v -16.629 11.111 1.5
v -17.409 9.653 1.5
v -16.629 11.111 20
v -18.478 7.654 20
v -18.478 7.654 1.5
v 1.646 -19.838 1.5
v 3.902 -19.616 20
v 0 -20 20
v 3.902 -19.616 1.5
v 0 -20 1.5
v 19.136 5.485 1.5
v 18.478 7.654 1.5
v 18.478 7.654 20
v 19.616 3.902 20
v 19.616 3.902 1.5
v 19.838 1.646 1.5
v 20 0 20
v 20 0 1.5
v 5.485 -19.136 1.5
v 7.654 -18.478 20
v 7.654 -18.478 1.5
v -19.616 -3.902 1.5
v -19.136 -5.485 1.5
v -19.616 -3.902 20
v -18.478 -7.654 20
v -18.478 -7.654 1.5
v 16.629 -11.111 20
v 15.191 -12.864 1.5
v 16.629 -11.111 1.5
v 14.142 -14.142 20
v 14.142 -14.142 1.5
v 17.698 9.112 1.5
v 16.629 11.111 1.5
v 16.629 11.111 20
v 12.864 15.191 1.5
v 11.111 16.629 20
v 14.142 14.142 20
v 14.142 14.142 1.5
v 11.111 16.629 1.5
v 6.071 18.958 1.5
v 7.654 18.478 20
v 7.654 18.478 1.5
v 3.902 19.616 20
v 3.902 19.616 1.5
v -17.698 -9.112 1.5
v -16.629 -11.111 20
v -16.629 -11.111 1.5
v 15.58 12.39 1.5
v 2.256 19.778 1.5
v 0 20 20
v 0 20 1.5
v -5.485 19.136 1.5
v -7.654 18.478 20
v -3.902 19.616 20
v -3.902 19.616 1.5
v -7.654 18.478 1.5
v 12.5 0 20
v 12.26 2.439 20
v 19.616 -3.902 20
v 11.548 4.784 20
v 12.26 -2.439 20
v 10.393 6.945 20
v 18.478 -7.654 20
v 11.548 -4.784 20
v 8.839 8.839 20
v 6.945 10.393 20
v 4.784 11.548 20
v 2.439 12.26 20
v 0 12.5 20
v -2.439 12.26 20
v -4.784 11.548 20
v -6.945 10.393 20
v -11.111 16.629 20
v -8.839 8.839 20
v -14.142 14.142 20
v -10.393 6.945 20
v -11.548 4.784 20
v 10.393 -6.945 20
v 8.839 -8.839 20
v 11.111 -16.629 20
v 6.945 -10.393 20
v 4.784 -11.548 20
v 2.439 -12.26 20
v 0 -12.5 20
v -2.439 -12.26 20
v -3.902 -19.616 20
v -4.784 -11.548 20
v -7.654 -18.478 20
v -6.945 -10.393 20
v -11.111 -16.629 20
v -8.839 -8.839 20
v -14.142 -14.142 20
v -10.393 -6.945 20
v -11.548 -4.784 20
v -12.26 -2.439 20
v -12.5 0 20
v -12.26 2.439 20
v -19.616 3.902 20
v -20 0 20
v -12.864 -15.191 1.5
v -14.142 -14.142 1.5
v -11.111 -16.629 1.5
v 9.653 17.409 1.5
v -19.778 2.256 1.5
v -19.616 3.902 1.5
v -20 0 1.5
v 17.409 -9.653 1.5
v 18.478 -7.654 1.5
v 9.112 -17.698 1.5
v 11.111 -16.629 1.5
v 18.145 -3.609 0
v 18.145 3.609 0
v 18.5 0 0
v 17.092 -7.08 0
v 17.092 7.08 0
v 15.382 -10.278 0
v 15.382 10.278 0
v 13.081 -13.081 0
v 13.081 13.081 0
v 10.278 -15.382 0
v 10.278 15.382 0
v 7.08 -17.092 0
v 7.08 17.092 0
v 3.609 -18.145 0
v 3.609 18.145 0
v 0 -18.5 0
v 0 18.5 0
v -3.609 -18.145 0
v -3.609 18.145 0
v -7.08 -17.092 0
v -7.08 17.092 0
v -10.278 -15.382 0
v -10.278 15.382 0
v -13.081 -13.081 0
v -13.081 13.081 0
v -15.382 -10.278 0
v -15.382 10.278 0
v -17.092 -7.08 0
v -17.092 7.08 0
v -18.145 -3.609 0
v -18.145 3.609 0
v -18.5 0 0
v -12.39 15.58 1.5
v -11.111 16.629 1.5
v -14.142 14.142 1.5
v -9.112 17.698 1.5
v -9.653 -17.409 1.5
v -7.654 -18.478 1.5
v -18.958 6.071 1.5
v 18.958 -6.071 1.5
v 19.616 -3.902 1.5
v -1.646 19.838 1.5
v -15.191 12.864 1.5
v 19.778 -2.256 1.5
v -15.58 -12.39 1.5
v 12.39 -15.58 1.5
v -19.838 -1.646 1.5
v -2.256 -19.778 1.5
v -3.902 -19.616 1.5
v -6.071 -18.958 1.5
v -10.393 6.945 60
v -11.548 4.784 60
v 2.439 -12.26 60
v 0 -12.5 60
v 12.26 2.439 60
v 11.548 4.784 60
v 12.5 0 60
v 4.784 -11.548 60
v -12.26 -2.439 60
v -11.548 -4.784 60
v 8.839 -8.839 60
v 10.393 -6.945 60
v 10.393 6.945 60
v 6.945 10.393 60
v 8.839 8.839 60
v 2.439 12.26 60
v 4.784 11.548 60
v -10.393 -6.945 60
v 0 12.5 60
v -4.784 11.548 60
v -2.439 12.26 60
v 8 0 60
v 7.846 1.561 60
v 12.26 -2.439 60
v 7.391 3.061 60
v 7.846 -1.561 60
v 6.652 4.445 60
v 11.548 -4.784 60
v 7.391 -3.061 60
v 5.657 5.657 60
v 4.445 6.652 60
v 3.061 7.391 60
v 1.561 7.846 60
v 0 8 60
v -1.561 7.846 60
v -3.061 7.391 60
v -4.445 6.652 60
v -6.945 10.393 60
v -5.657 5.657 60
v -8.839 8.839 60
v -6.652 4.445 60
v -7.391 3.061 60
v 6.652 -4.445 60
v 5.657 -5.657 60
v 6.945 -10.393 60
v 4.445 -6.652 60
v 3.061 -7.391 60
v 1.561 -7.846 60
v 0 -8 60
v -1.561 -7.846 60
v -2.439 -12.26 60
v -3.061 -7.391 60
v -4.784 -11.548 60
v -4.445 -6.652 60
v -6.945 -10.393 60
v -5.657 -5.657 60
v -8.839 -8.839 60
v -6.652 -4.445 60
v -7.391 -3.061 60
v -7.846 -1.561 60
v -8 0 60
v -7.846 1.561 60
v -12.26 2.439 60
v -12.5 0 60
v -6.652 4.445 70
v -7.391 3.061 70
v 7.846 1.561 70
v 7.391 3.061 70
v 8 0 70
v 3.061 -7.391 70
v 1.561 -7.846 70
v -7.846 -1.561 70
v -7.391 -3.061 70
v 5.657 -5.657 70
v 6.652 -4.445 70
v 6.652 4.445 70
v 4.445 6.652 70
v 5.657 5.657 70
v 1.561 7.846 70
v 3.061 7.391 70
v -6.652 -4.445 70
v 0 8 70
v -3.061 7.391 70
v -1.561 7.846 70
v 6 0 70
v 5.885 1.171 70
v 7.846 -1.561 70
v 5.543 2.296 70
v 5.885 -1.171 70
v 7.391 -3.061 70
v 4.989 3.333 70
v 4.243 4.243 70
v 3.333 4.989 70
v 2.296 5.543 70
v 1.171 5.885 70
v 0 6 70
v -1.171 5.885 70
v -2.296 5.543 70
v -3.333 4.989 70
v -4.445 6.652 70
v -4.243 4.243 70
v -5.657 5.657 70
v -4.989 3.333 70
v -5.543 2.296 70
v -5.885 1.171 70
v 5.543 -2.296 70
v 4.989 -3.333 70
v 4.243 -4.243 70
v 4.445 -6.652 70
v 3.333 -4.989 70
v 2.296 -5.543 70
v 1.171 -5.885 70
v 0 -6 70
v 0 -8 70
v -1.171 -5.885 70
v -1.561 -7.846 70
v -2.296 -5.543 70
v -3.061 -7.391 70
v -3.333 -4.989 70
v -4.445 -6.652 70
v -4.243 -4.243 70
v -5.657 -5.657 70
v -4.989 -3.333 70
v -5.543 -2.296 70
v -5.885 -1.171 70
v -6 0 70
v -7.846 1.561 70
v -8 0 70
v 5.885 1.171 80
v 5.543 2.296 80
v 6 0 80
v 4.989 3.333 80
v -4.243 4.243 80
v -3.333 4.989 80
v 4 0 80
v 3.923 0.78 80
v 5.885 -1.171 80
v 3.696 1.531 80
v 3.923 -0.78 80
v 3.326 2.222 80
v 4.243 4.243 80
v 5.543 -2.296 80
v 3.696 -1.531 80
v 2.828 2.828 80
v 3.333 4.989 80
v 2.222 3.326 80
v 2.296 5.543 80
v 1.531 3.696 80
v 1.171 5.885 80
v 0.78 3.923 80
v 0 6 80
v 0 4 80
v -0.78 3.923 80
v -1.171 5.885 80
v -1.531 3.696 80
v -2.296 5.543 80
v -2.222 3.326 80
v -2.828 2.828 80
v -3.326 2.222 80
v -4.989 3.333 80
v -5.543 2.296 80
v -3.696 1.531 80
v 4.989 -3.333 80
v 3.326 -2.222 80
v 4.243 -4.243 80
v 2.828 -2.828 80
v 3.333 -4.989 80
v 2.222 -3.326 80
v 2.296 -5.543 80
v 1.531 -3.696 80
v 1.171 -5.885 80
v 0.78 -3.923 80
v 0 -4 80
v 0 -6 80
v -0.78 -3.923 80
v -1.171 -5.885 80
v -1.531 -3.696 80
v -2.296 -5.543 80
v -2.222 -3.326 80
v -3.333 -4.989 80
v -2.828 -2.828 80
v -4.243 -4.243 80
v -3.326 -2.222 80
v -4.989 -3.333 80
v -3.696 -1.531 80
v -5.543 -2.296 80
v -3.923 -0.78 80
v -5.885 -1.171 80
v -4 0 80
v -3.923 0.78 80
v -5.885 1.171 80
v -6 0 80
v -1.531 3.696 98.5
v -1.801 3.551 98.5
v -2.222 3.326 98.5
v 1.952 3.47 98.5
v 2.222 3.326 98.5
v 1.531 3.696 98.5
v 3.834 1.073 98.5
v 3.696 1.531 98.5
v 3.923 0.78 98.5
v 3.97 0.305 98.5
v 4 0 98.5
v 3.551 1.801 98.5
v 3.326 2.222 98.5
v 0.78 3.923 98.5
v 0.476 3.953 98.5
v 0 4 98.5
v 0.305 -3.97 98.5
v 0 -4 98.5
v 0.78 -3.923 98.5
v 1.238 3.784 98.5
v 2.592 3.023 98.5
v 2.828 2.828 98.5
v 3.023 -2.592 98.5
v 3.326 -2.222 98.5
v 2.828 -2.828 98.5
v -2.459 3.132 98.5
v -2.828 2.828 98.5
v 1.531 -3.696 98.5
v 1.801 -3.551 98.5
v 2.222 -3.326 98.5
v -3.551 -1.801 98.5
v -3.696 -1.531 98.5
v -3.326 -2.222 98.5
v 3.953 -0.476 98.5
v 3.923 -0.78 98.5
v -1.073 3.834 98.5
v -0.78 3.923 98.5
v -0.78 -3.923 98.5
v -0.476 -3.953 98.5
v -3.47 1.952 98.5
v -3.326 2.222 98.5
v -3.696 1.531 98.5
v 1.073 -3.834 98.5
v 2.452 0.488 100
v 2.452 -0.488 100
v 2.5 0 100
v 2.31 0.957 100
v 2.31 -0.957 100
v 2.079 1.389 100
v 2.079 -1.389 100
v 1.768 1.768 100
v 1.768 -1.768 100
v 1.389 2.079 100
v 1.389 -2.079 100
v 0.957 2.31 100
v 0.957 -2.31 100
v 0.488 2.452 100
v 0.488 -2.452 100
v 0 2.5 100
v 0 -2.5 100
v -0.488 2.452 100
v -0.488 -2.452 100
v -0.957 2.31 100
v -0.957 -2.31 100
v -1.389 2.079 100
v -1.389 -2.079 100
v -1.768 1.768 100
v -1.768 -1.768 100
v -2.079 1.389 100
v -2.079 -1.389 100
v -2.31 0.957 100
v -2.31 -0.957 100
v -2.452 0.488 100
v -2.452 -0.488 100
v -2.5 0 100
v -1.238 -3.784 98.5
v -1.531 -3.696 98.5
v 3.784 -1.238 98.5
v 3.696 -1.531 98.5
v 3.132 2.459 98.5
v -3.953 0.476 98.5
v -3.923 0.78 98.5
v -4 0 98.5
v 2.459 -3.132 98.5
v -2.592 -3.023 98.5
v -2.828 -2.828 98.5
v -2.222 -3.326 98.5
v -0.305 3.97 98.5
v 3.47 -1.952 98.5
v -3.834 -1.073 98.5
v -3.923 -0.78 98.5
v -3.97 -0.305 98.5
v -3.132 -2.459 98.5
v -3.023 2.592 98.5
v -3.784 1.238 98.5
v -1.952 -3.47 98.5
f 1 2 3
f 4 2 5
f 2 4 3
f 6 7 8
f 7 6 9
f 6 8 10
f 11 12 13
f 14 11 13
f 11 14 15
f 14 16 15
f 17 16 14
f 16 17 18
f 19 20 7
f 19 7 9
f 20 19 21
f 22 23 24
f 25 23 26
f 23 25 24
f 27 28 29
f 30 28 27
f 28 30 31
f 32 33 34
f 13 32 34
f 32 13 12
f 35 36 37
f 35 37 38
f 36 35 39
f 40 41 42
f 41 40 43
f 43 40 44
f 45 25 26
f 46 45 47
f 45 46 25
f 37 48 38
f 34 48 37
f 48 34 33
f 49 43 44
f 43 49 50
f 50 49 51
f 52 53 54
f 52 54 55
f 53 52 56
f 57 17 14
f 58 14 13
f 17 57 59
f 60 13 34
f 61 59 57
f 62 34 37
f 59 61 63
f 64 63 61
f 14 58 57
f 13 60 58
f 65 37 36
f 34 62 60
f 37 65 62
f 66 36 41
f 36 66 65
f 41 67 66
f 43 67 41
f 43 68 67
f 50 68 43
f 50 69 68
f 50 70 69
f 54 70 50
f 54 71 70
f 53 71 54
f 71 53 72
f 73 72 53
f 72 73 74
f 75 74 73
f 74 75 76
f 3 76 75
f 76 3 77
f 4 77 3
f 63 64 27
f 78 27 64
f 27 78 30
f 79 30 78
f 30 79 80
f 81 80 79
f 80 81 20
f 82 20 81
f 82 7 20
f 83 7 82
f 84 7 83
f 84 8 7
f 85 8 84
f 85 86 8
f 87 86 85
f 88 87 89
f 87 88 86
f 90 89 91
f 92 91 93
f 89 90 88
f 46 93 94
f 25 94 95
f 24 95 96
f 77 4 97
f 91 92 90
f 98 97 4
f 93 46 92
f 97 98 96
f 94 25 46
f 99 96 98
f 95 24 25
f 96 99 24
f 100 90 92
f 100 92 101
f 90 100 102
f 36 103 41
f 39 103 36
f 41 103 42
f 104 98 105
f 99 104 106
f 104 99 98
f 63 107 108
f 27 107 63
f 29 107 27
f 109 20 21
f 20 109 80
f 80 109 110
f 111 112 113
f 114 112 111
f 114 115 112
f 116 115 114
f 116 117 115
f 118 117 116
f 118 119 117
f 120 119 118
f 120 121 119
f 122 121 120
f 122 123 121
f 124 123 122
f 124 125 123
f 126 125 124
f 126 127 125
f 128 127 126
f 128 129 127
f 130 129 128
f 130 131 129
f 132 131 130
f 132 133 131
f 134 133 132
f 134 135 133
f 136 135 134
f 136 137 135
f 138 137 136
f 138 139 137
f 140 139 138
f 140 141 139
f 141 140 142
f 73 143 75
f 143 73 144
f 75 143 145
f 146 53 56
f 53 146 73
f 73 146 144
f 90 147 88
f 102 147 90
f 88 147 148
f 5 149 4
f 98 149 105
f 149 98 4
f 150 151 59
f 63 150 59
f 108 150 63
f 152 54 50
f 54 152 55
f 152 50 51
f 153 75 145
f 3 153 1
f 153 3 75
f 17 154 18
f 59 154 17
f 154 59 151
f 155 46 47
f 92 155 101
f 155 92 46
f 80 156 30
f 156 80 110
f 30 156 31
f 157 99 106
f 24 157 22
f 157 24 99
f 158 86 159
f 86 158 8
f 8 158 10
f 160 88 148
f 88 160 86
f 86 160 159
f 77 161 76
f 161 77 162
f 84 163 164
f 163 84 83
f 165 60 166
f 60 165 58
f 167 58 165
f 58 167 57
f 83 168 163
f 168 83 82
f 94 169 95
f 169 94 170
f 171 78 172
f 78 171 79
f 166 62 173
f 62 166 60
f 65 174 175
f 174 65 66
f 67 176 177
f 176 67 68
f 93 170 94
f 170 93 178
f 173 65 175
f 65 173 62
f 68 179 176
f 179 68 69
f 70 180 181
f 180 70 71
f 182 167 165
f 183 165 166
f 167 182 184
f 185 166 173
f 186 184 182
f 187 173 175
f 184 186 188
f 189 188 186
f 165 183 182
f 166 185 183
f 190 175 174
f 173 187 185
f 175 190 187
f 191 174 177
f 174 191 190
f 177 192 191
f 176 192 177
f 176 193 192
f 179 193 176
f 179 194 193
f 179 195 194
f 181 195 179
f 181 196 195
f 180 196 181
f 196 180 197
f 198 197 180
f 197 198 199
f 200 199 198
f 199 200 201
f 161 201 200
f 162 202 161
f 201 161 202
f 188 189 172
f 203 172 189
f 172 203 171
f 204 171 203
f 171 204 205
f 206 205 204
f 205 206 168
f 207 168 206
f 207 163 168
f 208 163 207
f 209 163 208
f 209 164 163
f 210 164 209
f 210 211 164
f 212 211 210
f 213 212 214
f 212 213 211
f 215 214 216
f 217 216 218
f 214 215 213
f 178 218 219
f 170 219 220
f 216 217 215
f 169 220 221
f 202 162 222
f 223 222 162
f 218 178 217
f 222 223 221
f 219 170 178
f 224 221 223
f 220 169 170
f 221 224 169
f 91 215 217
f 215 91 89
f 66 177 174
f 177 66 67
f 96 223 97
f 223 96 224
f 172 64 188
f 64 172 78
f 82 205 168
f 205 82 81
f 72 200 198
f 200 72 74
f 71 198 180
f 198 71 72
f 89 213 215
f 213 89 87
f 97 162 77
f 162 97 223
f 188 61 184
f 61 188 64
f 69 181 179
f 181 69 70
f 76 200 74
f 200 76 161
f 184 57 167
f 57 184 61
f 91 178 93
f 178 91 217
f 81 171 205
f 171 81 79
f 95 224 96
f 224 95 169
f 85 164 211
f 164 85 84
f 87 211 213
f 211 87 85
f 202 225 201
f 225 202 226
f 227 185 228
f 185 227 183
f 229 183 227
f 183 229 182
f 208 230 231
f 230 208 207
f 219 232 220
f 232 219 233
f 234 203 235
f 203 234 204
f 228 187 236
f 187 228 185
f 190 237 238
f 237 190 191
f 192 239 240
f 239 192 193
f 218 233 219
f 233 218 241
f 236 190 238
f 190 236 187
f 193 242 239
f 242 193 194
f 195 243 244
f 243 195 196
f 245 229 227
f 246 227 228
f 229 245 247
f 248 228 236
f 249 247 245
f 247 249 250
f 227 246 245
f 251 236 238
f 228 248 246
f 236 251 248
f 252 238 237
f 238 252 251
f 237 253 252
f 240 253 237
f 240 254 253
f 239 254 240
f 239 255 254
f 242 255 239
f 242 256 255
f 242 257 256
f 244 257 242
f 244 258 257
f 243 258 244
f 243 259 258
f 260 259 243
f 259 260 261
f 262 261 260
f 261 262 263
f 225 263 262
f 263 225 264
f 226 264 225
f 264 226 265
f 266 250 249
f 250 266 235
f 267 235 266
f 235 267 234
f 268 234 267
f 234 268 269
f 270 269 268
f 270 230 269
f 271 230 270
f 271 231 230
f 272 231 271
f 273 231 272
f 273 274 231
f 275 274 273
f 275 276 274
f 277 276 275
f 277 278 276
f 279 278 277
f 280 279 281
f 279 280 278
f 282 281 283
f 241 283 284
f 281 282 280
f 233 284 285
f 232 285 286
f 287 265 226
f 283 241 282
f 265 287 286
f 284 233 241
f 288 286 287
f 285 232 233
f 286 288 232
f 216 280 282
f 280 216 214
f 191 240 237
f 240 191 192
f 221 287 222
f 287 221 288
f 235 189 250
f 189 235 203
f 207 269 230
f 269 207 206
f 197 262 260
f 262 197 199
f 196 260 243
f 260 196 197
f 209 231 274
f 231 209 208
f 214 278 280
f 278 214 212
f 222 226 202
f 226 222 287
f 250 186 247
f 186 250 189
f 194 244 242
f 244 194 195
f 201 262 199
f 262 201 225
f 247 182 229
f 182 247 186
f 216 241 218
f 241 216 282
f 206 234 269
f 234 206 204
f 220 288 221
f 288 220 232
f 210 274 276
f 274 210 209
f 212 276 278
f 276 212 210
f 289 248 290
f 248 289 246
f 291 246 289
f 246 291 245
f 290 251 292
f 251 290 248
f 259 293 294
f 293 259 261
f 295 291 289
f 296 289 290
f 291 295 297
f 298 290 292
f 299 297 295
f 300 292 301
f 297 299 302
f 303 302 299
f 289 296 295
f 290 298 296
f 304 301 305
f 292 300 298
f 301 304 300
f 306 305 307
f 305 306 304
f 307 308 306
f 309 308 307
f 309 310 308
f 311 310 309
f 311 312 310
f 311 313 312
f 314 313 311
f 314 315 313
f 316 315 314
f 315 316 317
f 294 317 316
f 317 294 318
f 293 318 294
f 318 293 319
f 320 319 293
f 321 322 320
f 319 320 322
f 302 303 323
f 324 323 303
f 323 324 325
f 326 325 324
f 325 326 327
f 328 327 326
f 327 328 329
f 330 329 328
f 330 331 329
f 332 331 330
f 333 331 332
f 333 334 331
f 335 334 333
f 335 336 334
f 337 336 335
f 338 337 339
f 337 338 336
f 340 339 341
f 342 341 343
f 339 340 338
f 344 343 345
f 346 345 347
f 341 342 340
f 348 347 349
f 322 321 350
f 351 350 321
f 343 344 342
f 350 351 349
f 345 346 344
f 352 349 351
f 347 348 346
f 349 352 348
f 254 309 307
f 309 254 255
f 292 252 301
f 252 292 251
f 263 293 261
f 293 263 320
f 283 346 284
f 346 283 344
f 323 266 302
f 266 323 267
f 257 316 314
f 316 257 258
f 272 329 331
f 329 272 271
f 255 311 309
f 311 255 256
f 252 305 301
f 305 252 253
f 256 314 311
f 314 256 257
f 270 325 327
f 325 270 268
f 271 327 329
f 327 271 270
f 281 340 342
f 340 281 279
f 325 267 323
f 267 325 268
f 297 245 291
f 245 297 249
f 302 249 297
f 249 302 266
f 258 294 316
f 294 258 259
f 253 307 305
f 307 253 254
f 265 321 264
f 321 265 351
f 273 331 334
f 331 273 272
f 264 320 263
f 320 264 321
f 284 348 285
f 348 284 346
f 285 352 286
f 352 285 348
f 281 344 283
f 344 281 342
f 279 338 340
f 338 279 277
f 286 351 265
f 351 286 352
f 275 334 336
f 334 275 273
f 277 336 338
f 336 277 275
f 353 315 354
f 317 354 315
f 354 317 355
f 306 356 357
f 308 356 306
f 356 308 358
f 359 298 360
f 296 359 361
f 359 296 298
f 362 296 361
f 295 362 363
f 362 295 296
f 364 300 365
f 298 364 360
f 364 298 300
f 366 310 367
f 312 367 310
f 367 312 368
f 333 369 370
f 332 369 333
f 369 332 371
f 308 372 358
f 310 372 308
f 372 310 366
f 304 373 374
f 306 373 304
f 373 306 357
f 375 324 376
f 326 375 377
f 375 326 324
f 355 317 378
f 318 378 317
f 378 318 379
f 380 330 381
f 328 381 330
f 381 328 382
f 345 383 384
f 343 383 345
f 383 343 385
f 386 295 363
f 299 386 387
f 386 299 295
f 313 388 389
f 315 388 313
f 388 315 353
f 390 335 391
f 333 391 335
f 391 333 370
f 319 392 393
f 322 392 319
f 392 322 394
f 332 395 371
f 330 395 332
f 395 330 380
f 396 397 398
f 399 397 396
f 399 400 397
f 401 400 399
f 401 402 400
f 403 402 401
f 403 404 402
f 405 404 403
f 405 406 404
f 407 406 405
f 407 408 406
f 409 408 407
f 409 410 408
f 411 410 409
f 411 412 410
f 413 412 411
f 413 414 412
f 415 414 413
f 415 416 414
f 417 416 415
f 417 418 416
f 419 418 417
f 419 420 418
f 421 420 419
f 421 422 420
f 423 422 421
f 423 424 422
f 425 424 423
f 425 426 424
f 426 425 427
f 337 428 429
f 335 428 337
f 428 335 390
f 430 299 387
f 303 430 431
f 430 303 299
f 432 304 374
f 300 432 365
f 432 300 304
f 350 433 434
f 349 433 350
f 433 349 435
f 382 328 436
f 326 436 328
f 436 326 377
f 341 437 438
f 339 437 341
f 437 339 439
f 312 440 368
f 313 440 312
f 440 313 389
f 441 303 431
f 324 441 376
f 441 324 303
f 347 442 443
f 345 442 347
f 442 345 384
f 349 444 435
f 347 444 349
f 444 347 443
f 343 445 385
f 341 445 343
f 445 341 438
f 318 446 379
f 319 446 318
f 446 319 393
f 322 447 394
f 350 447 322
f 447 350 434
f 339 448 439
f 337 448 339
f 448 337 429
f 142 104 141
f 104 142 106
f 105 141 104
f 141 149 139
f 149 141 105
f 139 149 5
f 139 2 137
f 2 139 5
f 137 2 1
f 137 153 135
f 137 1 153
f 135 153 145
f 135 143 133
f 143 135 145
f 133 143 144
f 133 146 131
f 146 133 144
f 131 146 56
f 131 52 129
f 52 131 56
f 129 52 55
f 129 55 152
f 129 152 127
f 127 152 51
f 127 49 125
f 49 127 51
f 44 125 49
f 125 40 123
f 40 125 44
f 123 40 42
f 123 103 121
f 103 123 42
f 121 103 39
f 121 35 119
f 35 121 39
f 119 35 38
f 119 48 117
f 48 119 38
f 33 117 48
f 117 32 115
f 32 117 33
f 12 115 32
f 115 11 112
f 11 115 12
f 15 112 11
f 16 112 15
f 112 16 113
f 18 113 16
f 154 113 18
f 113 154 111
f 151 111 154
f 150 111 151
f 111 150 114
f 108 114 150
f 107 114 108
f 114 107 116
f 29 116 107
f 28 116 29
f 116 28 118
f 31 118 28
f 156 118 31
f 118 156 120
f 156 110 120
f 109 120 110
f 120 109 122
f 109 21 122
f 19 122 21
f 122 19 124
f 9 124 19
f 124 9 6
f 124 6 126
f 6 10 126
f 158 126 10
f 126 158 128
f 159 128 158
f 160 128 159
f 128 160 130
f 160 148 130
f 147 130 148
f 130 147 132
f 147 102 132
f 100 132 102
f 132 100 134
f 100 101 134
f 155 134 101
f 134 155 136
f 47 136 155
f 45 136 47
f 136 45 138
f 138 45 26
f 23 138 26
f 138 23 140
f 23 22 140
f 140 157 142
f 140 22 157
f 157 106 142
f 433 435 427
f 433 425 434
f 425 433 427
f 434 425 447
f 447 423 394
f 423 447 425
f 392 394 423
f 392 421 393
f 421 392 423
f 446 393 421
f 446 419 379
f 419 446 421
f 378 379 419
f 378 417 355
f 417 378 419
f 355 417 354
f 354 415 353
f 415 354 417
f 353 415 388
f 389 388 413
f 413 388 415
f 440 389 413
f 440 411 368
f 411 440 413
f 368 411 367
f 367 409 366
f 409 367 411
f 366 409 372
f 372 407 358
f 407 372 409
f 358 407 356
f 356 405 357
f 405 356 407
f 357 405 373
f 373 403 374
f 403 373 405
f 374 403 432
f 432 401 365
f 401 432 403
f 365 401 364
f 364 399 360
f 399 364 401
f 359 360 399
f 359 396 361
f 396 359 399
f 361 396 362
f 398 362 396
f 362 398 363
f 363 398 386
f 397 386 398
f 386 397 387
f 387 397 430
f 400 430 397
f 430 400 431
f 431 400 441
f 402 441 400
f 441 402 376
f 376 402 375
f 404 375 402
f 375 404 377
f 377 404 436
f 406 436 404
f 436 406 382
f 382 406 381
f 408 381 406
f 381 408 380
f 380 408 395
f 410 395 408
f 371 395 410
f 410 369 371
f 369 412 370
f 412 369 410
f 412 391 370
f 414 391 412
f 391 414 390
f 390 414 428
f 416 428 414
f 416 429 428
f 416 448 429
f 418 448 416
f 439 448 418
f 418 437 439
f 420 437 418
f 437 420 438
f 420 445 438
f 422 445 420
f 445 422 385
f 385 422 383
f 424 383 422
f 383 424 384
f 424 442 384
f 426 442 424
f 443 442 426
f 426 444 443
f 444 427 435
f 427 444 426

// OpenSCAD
$fn = 32;

// ----------------------------------------------------------------------
// Stepped shaft: diameters 40, 25, 16, 12, 8 mm, 100 mm long
// ----------------------------------------------------------------------

// --- parameters (mm) ---
d1 = 40;                  // step 1 diameter
len1 = 20;                // step 1 length
d2 = 25;                  // step 2 diameter
len2 = 40;                // step 2 length
d3 = 16;                  // step 3 diameter
len3 = 10;                // step 3 length
d4 = 12;                  // step 4 diameter
len4 = 10;                // step 4 length
d5 = 8;                   // step 5 diameter
len5 = 20;                // step 5 length
total = 100;              // overall length
chamfer = 1.5;            // end chamfer

difference() {
  /* turned body: stacked cylinders, every step sunk into the bigger one */
  union() {
    cylinder(h = len1, d = d1);
    translate([0, 0, 19.6]) cylinder(h = 40.4, d = d2);
    translate([0, 0, 59.6]) cylinder(h = 10.4, d = d3);
    translate([0, 0, 69.6]) cylinder(h = 10.4, d = d4);
    translate([0, 0, 79.6]) cylinder(h = 20.4, d = d5);
  }
  /* bottom chamfer ring cut */
  rotate_extrude() translate([18.5, -2.5]) polygon([[0, 0], [4, 0], [4, 6.5], [0, 2.5]]);
  /* top chamfer ring cut */
  rotate_extrude() translate([2.5, 100]) polygon([[0, 0], [4, -4], [4, 2.5], [0, 2.5]]);
}
